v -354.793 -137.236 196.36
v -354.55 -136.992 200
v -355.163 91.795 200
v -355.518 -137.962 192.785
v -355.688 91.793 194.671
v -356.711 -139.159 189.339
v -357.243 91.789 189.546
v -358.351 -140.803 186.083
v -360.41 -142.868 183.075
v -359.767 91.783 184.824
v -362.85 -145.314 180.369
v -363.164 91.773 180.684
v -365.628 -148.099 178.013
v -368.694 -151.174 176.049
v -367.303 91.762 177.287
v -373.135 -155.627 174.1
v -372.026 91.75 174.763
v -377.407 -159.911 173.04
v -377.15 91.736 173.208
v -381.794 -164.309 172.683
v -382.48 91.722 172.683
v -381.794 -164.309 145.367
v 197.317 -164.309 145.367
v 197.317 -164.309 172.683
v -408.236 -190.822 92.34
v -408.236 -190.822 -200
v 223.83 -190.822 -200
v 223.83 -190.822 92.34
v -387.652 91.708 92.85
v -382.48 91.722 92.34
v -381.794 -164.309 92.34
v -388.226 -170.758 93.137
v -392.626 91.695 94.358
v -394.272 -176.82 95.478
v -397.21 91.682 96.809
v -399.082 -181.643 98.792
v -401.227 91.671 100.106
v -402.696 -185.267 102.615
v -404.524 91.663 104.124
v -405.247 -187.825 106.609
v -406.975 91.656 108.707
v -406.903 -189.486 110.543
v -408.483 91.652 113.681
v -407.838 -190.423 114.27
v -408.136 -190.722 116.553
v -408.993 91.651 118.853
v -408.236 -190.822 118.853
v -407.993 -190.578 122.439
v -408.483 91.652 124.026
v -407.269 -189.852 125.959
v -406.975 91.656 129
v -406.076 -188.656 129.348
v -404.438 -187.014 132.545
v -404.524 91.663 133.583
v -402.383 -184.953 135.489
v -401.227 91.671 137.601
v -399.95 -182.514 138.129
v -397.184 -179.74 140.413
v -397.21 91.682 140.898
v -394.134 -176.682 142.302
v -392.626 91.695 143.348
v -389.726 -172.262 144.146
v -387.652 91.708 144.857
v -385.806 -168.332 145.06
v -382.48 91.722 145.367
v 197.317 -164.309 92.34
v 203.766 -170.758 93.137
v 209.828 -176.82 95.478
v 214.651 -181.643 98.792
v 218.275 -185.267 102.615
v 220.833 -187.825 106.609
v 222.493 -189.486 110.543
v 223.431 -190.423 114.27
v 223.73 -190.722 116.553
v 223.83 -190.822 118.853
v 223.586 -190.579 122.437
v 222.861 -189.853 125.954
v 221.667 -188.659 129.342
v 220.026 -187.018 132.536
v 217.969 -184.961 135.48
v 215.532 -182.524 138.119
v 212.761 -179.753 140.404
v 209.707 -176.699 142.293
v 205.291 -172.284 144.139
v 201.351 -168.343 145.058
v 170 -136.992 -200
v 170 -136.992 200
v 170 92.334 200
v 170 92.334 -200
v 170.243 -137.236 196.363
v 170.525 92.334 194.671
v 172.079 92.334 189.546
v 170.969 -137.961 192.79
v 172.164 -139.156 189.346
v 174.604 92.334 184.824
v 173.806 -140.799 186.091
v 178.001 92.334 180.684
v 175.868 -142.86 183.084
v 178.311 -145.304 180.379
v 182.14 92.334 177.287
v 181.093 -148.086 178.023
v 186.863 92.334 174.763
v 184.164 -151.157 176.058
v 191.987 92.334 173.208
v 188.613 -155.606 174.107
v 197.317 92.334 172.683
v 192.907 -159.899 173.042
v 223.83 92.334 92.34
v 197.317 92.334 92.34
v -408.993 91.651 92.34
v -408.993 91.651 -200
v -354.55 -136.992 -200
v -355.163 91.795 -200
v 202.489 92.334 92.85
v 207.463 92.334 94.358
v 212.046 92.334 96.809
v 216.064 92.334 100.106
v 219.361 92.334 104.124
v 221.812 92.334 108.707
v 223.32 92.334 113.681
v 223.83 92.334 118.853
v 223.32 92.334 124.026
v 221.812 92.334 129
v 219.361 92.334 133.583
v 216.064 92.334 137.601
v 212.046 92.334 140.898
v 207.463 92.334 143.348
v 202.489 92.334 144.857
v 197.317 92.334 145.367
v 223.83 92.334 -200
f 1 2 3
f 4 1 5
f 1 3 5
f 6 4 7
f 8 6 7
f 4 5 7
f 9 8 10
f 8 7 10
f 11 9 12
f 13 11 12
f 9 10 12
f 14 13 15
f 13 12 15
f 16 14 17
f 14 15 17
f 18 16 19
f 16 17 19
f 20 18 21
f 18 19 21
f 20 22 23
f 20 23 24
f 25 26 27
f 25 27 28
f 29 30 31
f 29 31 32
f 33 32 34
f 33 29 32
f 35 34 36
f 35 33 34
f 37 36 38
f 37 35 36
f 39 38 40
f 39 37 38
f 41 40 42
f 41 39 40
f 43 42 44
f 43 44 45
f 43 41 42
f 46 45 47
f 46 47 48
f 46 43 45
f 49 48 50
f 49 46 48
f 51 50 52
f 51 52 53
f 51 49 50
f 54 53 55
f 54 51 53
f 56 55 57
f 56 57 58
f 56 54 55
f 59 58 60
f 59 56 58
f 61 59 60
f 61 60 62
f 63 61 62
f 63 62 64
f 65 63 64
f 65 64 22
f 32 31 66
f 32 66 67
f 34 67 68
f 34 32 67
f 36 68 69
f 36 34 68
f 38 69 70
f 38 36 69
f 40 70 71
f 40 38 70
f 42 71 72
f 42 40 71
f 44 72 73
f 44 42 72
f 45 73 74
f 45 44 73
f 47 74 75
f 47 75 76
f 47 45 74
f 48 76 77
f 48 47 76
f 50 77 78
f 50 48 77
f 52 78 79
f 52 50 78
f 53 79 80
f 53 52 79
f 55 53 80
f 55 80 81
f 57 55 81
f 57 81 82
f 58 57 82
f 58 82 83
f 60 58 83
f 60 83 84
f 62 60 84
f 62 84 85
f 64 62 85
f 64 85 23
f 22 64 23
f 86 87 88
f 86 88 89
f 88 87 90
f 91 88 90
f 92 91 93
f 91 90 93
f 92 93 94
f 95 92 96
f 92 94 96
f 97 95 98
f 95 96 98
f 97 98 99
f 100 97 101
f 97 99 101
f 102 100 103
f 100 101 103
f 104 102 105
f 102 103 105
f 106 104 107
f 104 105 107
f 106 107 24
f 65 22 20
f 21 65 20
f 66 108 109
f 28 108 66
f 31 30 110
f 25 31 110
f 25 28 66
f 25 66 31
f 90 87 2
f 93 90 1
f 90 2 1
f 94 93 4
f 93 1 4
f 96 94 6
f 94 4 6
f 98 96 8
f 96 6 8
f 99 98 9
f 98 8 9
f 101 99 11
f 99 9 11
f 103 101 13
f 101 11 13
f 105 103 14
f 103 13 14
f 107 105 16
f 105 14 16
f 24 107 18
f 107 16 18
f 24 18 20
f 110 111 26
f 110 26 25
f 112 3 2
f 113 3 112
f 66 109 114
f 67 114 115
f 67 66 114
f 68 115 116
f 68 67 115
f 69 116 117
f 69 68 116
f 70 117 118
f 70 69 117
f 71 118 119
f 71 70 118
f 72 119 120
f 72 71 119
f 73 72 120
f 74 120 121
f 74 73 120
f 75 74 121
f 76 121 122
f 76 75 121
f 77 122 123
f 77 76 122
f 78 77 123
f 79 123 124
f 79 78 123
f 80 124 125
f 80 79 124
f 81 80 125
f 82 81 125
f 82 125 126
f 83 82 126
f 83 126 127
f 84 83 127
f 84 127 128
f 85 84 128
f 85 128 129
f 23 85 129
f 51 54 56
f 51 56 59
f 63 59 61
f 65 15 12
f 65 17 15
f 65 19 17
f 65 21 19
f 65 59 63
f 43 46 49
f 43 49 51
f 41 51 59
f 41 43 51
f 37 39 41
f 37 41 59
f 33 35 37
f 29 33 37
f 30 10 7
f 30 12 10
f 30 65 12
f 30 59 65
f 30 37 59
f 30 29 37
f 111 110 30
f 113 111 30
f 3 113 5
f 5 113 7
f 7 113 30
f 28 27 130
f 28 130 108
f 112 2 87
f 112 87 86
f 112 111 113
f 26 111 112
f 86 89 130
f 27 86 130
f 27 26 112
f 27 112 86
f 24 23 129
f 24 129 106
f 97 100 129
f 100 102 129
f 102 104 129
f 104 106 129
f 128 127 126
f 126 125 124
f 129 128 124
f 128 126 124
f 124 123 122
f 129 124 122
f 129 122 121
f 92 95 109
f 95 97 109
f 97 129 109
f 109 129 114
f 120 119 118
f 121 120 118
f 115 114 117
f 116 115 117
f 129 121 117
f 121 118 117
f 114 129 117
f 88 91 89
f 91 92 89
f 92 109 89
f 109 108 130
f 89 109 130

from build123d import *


# Not quite as in the source:
# - the program builds the solid bodies; features that only make, move or delete a surface that nothing else refers to are left out


with BuildPart() as f2:
    # F2: sweep along a path in F1
    with BuildLine(Plane.XY) as f2_path:
        Line((131.5030422138, 92.3344379031), (131.5030422138, -98.4952900969))
        Line((131.5030422138, -98.4952900969), (-316.1564137862, -98.4952900969))
        Line((-316.1564137862, -98.4952900969), (-316.6663944721, 91.8979942799))
    # F0 (on Front) → F2 (sweep)
    with BuildSketch(Plane.XZ):
        with BuildLine():
            Line((223.829728, 92.340303), (197.316539, 92.340303))
            ThreePointArc((197.316539, 92.340303), (223.829728, 118.853492), (197.316539, 145.366681))
            Line((197.316539, 145.366681), (197.316539, 172.683461))
            ThreePointArc((197.316539, 172.683461), (178.0008290346, 180.6842900346), (170, 200))
            Line((170, 200), (170, -200))
            Line((170, -200), (223.829728, -200))
            Line((223.829728, -200), (223.829728, 92.340303))
        make_face()
    sweep(path=f2_path.line, transition=Transition.RIGHT)


solid = f2.part
